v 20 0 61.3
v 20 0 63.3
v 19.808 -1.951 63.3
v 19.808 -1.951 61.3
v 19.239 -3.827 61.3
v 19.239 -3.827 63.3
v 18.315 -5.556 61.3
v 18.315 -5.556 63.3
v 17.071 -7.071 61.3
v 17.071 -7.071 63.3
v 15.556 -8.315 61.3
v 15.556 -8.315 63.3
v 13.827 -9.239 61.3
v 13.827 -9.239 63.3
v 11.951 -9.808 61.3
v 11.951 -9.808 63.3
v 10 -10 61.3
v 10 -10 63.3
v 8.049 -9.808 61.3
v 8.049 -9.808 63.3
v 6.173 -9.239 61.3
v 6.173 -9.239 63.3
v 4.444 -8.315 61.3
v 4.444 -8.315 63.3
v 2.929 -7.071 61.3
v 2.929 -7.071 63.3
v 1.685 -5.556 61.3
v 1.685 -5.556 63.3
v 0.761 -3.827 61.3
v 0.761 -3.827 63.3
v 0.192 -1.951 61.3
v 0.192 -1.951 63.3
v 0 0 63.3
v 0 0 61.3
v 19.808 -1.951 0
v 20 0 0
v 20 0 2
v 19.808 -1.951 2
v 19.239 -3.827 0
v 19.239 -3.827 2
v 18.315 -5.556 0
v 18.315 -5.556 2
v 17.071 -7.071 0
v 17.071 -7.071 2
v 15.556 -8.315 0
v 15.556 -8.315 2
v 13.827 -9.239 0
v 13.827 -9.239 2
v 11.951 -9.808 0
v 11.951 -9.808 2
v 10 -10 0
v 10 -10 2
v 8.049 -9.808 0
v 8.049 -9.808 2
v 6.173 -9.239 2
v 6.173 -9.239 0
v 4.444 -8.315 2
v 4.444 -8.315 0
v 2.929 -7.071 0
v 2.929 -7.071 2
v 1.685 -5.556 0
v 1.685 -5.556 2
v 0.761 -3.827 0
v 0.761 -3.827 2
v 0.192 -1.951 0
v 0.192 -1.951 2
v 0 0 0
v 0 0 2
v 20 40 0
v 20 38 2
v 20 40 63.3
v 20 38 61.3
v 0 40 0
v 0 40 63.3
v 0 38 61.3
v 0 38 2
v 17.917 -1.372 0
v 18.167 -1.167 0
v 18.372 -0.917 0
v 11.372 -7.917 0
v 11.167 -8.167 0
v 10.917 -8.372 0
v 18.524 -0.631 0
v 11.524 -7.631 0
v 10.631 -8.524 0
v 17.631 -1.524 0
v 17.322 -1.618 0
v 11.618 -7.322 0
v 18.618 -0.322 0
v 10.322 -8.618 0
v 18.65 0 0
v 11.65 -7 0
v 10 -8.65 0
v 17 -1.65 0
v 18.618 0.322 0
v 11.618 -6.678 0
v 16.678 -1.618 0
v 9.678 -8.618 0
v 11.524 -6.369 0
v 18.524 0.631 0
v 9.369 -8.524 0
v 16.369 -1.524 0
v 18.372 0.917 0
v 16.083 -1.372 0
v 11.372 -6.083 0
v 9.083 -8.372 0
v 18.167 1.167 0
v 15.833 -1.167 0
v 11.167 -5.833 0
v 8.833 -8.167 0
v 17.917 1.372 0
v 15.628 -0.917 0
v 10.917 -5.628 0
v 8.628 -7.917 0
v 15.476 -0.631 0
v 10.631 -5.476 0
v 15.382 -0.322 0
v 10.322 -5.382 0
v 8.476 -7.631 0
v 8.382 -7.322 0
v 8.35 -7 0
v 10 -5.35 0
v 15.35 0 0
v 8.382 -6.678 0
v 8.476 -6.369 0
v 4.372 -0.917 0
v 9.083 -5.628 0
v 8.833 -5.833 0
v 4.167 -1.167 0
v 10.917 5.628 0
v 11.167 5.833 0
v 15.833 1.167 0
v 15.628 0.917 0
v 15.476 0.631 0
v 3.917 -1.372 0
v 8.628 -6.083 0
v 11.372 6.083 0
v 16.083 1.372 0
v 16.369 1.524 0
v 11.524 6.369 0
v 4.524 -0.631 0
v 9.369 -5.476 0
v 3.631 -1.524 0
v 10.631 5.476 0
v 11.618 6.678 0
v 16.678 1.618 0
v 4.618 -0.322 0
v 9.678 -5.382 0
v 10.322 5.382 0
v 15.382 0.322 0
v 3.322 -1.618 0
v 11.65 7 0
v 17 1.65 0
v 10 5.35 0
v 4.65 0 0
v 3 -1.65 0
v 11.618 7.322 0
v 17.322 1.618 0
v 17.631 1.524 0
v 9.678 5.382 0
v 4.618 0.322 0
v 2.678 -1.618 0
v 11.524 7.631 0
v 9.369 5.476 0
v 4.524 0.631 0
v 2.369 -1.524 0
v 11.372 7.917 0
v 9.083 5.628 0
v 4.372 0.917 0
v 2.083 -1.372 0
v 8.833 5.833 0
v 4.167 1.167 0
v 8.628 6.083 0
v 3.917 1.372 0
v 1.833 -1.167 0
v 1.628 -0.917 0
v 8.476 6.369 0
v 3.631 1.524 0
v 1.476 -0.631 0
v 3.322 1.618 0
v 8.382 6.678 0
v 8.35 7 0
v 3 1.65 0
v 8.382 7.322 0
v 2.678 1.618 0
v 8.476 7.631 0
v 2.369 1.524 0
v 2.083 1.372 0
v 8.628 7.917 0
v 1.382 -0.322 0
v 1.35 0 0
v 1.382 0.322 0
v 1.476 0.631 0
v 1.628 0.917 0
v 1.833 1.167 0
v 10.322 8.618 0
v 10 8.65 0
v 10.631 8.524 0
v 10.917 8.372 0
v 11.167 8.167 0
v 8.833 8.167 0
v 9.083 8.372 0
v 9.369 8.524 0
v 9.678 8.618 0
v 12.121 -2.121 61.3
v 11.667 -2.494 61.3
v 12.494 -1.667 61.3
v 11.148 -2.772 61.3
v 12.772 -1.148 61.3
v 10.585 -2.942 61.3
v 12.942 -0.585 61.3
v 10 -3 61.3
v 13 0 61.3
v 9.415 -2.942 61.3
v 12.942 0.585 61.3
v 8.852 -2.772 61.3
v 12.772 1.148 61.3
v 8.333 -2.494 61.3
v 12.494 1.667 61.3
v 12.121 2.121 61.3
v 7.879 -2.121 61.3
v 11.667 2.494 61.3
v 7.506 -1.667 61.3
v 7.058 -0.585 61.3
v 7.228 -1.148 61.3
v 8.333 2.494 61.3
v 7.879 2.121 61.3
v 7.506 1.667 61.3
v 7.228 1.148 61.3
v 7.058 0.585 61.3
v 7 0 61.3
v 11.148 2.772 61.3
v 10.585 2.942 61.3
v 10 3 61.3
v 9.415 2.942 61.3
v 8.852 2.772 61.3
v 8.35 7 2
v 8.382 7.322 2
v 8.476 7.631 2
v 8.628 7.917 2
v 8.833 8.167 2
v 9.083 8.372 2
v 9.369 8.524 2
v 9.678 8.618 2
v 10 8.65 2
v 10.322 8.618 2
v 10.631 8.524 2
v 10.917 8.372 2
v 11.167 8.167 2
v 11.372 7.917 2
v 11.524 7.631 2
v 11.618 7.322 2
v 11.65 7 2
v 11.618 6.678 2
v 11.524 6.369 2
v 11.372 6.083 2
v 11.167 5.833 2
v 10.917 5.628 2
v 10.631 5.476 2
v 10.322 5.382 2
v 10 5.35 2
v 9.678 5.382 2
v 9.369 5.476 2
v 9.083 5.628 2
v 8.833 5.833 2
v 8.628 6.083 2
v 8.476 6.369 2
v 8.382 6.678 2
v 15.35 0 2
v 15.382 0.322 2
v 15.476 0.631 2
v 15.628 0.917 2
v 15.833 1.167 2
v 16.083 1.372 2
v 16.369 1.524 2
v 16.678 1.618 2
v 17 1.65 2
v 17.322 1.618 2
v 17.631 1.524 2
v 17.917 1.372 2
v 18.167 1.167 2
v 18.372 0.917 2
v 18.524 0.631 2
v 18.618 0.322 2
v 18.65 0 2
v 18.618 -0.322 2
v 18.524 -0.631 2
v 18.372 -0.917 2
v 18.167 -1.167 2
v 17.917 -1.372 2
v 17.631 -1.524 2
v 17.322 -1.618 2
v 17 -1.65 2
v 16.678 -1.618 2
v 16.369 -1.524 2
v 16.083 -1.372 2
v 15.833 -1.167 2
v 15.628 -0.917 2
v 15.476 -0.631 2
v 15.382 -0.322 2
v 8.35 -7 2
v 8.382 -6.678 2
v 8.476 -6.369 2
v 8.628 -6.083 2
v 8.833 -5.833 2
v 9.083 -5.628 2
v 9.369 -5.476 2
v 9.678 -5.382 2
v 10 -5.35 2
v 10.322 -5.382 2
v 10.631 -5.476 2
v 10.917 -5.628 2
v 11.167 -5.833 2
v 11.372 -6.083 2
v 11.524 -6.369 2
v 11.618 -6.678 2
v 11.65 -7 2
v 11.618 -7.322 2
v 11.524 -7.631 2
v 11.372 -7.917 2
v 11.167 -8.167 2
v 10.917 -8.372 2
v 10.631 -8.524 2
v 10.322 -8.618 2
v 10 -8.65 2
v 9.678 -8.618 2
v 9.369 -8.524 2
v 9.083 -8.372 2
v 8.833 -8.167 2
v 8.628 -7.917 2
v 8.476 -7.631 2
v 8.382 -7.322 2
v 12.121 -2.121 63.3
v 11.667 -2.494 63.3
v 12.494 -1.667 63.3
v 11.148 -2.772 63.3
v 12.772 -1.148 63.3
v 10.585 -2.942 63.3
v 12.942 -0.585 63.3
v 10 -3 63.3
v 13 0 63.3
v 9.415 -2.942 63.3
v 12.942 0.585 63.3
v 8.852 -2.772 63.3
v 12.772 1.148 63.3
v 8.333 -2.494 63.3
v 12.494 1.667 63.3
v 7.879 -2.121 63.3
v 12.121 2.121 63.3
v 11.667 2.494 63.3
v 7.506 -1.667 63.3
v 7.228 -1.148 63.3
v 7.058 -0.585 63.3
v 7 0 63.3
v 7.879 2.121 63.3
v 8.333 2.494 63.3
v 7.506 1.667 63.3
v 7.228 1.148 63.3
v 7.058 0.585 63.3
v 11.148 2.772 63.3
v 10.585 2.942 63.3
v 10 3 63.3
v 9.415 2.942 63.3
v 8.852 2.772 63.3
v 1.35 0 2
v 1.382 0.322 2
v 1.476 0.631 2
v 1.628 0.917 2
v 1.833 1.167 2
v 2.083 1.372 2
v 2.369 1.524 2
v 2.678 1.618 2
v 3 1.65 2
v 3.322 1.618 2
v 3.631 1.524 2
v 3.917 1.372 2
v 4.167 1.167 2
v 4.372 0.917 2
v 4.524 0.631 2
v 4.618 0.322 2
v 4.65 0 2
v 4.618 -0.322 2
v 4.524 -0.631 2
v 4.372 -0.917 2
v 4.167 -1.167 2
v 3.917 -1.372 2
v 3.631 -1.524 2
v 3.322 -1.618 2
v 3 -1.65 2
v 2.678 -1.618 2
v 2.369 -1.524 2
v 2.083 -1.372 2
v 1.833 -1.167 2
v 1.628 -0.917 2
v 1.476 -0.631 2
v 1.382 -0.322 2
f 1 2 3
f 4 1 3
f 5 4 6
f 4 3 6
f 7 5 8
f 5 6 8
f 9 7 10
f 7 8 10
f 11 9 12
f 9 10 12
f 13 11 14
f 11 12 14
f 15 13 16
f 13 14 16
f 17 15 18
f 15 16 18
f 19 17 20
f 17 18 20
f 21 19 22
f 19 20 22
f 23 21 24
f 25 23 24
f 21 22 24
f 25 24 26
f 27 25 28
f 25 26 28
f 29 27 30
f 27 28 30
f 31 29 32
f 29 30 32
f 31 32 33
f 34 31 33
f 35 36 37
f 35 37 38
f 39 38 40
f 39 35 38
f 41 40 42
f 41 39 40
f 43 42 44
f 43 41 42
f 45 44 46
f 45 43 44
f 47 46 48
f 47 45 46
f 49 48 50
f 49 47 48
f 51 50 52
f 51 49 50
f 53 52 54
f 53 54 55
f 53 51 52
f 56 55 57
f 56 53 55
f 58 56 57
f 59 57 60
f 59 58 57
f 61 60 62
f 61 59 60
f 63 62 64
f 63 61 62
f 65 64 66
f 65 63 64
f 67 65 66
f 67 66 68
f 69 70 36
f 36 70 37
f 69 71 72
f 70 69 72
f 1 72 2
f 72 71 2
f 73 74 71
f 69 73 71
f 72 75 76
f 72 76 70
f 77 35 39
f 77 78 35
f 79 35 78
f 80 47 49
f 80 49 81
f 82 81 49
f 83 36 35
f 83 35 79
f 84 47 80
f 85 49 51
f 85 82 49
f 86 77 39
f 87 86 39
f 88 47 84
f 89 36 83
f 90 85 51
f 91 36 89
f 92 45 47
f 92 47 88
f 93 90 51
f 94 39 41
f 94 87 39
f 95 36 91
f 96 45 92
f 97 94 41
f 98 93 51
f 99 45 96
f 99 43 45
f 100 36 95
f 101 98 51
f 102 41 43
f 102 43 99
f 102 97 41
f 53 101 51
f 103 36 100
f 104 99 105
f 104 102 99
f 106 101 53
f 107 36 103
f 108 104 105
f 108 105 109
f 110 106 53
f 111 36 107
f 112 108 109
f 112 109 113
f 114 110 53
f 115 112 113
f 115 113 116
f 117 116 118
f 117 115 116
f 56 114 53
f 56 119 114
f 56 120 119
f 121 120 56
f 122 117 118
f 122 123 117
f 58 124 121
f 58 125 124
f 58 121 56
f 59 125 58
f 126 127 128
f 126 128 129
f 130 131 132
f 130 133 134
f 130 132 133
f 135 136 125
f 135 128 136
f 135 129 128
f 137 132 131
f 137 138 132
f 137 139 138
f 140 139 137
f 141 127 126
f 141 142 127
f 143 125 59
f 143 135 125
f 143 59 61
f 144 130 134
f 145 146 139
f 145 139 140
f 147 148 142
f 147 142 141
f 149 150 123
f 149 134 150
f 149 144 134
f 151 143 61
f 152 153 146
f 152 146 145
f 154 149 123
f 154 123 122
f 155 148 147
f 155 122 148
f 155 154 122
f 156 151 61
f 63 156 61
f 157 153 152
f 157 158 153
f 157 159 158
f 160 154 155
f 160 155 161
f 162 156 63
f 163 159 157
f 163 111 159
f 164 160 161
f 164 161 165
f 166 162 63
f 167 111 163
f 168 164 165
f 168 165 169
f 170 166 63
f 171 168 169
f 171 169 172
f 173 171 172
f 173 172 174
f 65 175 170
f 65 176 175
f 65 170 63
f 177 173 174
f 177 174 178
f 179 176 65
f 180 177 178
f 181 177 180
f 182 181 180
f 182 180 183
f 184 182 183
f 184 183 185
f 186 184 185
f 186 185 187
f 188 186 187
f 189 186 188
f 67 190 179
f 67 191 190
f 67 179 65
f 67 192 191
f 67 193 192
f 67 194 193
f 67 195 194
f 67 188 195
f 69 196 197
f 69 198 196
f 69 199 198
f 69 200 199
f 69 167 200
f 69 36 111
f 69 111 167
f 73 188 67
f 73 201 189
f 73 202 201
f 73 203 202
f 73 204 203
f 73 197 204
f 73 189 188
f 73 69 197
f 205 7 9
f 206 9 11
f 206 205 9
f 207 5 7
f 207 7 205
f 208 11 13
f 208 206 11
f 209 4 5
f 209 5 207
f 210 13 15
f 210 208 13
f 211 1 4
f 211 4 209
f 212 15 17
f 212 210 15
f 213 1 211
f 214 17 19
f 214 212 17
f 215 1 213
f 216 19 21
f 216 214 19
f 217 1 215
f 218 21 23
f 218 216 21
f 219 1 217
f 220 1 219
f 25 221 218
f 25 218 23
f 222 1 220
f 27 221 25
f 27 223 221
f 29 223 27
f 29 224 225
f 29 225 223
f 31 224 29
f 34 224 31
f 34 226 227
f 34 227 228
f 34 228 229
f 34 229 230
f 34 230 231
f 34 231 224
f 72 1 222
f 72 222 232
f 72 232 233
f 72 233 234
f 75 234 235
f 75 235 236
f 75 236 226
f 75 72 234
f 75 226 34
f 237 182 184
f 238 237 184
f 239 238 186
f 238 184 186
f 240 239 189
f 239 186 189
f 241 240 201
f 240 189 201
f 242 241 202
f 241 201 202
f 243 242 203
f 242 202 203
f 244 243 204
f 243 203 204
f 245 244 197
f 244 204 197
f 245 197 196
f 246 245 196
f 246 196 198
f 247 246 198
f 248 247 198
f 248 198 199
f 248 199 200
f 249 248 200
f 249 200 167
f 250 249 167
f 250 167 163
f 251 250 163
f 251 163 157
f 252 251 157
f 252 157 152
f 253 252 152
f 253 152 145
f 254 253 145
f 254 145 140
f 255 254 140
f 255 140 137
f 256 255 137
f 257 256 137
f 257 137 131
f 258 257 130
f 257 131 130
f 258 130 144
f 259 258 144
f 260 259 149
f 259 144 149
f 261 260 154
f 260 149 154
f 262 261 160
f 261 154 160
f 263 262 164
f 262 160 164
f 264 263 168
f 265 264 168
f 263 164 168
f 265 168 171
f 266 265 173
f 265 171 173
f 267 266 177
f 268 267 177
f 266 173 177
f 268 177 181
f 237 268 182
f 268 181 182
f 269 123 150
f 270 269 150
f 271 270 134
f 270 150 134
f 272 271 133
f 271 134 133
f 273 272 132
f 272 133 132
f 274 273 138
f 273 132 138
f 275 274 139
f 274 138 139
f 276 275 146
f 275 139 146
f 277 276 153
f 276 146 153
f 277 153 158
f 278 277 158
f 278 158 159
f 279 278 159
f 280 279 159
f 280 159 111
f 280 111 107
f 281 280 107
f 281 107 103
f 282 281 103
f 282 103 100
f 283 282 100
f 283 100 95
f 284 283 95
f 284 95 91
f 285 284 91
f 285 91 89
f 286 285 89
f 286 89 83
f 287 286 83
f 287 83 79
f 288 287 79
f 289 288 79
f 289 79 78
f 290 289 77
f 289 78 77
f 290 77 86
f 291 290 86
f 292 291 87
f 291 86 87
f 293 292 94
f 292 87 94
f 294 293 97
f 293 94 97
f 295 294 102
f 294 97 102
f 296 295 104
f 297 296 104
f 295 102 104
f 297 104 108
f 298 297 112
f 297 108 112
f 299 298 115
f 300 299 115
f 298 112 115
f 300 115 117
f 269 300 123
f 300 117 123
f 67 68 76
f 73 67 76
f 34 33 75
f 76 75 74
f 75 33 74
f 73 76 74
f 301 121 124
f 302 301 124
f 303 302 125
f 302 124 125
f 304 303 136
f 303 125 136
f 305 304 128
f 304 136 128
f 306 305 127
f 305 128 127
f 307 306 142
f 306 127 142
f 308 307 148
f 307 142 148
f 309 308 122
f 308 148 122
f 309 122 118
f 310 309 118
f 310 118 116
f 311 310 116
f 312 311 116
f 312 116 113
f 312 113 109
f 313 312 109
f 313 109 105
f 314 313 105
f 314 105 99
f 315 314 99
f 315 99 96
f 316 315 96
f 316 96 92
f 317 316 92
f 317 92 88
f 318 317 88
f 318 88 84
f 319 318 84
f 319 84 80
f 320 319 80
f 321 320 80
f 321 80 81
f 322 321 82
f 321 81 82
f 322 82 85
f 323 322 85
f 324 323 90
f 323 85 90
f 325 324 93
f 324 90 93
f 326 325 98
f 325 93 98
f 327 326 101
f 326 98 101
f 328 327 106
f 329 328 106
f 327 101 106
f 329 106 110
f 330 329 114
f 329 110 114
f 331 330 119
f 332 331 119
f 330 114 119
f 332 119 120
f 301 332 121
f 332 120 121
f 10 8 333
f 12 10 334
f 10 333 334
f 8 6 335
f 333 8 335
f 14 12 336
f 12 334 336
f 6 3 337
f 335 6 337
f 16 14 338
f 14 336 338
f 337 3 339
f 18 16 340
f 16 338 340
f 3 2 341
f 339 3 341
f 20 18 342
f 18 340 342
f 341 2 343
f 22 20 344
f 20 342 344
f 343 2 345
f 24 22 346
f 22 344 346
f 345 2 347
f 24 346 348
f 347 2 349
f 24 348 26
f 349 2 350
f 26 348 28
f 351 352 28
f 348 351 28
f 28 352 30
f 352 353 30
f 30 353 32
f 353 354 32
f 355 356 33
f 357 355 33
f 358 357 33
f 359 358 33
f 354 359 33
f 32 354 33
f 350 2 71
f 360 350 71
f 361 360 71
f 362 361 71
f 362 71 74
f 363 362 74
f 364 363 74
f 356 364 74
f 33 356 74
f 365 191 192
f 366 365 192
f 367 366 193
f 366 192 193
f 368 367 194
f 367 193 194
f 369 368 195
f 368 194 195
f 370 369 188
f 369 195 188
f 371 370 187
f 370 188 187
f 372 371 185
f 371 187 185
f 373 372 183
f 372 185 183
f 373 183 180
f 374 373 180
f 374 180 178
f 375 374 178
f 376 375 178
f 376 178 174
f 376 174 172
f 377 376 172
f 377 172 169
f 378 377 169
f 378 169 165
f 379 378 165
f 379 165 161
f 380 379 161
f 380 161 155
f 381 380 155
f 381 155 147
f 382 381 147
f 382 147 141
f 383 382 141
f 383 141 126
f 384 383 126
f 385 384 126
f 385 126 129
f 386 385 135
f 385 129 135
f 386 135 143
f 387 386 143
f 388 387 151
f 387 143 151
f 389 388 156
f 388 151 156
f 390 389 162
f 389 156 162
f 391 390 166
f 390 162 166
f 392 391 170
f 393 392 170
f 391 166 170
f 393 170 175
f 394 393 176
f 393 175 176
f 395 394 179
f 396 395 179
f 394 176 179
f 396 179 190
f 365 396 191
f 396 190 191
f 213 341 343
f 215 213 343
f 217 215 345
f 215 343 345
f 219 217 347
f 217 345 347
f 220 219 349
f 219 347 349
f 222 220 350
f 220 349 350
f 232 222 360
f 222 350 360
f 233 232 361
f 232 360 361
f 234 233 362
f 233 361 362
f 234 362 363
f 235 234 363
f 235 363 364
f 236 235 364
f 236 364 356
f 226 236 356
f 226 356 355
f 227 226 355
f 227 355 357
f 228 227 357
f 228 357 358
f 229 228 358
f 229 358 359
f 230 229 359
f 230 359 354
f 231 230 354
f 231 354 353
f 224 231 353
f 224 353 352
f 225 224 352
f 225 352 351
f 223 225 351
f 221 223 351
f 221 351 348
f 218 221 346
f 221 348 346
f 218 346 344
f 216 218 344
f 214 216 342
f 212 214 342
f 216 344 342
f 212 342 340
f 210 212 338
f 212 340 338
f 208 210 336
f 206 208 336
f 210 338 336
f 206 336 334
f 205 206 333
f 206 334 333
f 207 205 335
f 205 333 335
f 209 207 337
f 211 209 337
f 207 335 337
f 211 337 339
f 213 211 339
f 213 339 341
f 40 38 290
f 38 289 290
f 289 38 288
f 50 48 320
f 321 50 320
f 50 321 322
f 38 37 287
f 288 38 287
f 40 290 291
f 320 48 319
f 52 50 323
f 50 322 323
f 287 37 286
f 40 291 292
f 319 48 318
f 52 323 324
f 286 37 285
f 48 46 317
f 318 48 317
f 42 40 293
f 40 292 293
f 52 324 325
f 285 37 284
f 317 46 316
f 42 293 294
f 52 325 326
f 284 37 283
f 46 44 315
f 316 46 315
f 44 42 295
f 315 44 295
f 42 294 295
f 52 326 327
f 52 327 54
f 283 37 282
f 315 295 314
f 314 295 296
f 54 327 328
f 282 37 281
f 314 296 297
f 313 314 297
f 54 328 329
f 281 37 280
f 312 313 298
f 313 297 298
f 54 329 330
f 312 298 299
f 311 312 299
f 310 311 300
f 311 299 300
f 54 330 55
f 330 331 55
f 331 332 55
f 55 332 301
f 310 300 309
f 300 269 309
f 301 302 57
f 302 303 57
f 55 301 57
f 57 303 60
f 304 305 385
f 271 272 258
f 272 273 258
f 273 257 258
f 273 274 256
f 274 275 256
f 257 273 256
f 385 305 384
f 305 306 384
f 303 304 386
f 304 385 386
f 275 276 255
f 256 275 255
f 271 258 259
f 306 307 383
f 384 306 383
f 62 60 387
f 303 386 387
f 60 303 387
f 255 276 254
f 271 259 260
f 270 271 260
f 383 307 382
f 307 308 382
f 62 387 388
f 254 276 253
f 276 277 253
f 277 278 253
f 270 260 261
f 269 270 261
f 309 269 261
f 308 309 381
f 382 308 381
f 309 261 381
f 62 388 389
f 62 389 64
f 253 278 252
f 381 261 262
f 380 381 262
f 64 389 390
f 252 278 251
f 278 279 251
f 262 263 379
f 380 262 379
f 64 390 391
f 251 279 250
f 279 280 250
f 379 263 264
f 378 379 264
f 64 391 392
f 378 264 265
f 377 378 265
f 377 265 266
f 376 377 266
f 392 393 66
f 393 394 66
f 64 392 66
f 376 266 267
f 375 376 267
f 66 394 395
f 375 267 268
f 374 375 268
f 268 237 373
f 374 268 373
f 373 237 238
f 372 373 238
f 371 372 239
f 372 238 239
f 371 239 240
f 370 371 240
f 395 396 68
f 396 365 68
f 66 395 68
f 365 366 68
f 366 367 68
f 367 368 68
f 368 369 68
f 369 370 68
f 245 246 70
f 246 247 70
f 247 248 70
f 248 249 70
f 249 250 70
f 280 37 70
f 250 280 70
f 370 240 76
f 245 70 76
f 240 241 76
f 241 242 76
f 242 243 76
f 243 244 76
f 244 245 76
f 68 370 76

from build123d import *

# Parameters (mm, degrees)
EXTRUDE_1_DEPTH     = 2
SKETCH_2_W          = 20
SKETCH_2_H          = 2
EXTRUDE_2_DEPTH     = 61.3
CUT_EXTRUDE_1_REACH = 79.504
SKETCH_4_R          = 3
CUT_EXTRUDE_2_REACH = 79.504
SKETCH_5_R          = 1.65


with BuildPart() as part:
    # 草图1 → 凸台-拉伸1 (new body)
    with BuildSketch(Plane.XY):
        with BuildLine():
            Line((0, 0), (0, 40))
            Line((0, 40), (20, 40))
            Line((20, 40), (20, 0))
            ThreePointArc((20, 0), (10, -10), (0, 0))
        make_face()
    extrude_1 = extrude(amount=EXTRUDE_1_DEPTH)

    # 草图2 → 凸台-拉伸2 (add)
    with BuildSketch(Plane.XY.offset(2)):
        with Locations((10, 39)):
            Rectangle(SKETCH_2_W, SKETCH_2_H)
    extrude(amount=EXTRUDE_2_DEPTH)

    # 镜向1: 凸台-拉伸1 across plane
    add(extrude_1.mirror(Plane.XY.offset(31.65)))

    # 草图4 → 切除-拉伸1 (cut, up to next)
    with BuildSketch(Plane.XY.offset(63.3), mode=Mode.PRIVATE) as cut_extrude_1_sk1:
        with Locations((10, 0)):
            Circle(SKETCH_4_R)
    cut_extrude_1_tool1 = extrude(cut_extrude_1_sk1.sketch, amount=-CUT_EXTRUDE_1_REACH, mode=Mode.PRIVATE) & part.part
    add(cut_extrude_1_tool1.solids().sort_by_distance((10, 0, 63.3))[0], mode=Mode.SUBTRACT)

    # 草图5 → 切除-拉伸2 (cut, up to next)
    with BuildSketch(Plane(origin=(0, 0, 0), x_dir=(-1, 0, 0), z_dir=(0, 0, -1)), mode=Mode.PRIVATE) as cut_extrude_2_sk1:
        with Locations((-10, -7)):
            Circle(SKETCH_5_R)
    cut_extrude_2_tool1 = extrude(cut_extrude_2_sk1.sketch, amount=-CUT_EXTRUDE_2_REACH, mode=Mode.PRIVATE) & part.part
    # 草图5 → 切除-拉伸2 (cut, up to next)
    with BuildSketch(Plane(origin=(0, 0, 0), x_dir=(-1, 0, 0), z_dir=(0, 0, -1)), mode=Mode.PRIVATE) as cut_extrude_2_sk2:
        with Locations((-17, 0)):
            Circle(SKETCH_5_R)
    cut_extrude_2_tool2 = extrude(cut_extrude_2_sk2.sketch, amount=-CUT_EXTRUDE_2_REACH, mode=Mode.PRIVATE) & part.part
    # 草图5 → 切除-拉伸2 (cut, up to next)
    with BuildSketch(Plane(origin=(0, 0, 0), x_dir=(-1, 0, 0), z_dir=(0, 0, -1)), mode=Mode.PRIVATE) as cut_extrude_2_sk3:
        with Locations((-10, 7)):
            Circle(SKETCH_5_R)
    cut_extrude_2_tool3 = extrude(cut_extrude_2_sk3.sketch, amount=-CUT_EXTRUDE_2_REACH, mode=Mode.PRIVATE) & part.part
    # 草图5 → 切除-拉伸2 (cut, up to next)
    with BuildSketch(Plane(origin=(0, 0, 0), x_dir=(-1, 0, 0), z_dir=(0, 0, -1)), mode=Mode.PRIVATE) as cut_extrude_2_sk4:
        with Locations((-3, 0)):
            Circle(SKETCH_5_R)
    cut_extrude_2_tool4 = extrude(cut_extrude_2_sk4.sketch, amount=-CUT_EXTRUDE_2_REACH, mode=Mode.PRIVATE) & part.part
    add(cut_extrude_2_tool1.solids().sort_by_distance((10, -7, 0))[0], mode=Mode.SUBTRACT)
    add(cut_extrude_2_tool2.solids().sort_by_distance((17, 0, 0))[0], mode=Mode.SUBTRACT)
    add(cut_extrude_2_tool3.solids().sort_by_distance((10, 7, 0))[0], mode=Mode.SUBTRACT)
    add(cut_extrude_2_tool4.solids().sort_by_distance((3, 0, 0))[0], mode=Mode.SUBTRACT)


solid = part.part
